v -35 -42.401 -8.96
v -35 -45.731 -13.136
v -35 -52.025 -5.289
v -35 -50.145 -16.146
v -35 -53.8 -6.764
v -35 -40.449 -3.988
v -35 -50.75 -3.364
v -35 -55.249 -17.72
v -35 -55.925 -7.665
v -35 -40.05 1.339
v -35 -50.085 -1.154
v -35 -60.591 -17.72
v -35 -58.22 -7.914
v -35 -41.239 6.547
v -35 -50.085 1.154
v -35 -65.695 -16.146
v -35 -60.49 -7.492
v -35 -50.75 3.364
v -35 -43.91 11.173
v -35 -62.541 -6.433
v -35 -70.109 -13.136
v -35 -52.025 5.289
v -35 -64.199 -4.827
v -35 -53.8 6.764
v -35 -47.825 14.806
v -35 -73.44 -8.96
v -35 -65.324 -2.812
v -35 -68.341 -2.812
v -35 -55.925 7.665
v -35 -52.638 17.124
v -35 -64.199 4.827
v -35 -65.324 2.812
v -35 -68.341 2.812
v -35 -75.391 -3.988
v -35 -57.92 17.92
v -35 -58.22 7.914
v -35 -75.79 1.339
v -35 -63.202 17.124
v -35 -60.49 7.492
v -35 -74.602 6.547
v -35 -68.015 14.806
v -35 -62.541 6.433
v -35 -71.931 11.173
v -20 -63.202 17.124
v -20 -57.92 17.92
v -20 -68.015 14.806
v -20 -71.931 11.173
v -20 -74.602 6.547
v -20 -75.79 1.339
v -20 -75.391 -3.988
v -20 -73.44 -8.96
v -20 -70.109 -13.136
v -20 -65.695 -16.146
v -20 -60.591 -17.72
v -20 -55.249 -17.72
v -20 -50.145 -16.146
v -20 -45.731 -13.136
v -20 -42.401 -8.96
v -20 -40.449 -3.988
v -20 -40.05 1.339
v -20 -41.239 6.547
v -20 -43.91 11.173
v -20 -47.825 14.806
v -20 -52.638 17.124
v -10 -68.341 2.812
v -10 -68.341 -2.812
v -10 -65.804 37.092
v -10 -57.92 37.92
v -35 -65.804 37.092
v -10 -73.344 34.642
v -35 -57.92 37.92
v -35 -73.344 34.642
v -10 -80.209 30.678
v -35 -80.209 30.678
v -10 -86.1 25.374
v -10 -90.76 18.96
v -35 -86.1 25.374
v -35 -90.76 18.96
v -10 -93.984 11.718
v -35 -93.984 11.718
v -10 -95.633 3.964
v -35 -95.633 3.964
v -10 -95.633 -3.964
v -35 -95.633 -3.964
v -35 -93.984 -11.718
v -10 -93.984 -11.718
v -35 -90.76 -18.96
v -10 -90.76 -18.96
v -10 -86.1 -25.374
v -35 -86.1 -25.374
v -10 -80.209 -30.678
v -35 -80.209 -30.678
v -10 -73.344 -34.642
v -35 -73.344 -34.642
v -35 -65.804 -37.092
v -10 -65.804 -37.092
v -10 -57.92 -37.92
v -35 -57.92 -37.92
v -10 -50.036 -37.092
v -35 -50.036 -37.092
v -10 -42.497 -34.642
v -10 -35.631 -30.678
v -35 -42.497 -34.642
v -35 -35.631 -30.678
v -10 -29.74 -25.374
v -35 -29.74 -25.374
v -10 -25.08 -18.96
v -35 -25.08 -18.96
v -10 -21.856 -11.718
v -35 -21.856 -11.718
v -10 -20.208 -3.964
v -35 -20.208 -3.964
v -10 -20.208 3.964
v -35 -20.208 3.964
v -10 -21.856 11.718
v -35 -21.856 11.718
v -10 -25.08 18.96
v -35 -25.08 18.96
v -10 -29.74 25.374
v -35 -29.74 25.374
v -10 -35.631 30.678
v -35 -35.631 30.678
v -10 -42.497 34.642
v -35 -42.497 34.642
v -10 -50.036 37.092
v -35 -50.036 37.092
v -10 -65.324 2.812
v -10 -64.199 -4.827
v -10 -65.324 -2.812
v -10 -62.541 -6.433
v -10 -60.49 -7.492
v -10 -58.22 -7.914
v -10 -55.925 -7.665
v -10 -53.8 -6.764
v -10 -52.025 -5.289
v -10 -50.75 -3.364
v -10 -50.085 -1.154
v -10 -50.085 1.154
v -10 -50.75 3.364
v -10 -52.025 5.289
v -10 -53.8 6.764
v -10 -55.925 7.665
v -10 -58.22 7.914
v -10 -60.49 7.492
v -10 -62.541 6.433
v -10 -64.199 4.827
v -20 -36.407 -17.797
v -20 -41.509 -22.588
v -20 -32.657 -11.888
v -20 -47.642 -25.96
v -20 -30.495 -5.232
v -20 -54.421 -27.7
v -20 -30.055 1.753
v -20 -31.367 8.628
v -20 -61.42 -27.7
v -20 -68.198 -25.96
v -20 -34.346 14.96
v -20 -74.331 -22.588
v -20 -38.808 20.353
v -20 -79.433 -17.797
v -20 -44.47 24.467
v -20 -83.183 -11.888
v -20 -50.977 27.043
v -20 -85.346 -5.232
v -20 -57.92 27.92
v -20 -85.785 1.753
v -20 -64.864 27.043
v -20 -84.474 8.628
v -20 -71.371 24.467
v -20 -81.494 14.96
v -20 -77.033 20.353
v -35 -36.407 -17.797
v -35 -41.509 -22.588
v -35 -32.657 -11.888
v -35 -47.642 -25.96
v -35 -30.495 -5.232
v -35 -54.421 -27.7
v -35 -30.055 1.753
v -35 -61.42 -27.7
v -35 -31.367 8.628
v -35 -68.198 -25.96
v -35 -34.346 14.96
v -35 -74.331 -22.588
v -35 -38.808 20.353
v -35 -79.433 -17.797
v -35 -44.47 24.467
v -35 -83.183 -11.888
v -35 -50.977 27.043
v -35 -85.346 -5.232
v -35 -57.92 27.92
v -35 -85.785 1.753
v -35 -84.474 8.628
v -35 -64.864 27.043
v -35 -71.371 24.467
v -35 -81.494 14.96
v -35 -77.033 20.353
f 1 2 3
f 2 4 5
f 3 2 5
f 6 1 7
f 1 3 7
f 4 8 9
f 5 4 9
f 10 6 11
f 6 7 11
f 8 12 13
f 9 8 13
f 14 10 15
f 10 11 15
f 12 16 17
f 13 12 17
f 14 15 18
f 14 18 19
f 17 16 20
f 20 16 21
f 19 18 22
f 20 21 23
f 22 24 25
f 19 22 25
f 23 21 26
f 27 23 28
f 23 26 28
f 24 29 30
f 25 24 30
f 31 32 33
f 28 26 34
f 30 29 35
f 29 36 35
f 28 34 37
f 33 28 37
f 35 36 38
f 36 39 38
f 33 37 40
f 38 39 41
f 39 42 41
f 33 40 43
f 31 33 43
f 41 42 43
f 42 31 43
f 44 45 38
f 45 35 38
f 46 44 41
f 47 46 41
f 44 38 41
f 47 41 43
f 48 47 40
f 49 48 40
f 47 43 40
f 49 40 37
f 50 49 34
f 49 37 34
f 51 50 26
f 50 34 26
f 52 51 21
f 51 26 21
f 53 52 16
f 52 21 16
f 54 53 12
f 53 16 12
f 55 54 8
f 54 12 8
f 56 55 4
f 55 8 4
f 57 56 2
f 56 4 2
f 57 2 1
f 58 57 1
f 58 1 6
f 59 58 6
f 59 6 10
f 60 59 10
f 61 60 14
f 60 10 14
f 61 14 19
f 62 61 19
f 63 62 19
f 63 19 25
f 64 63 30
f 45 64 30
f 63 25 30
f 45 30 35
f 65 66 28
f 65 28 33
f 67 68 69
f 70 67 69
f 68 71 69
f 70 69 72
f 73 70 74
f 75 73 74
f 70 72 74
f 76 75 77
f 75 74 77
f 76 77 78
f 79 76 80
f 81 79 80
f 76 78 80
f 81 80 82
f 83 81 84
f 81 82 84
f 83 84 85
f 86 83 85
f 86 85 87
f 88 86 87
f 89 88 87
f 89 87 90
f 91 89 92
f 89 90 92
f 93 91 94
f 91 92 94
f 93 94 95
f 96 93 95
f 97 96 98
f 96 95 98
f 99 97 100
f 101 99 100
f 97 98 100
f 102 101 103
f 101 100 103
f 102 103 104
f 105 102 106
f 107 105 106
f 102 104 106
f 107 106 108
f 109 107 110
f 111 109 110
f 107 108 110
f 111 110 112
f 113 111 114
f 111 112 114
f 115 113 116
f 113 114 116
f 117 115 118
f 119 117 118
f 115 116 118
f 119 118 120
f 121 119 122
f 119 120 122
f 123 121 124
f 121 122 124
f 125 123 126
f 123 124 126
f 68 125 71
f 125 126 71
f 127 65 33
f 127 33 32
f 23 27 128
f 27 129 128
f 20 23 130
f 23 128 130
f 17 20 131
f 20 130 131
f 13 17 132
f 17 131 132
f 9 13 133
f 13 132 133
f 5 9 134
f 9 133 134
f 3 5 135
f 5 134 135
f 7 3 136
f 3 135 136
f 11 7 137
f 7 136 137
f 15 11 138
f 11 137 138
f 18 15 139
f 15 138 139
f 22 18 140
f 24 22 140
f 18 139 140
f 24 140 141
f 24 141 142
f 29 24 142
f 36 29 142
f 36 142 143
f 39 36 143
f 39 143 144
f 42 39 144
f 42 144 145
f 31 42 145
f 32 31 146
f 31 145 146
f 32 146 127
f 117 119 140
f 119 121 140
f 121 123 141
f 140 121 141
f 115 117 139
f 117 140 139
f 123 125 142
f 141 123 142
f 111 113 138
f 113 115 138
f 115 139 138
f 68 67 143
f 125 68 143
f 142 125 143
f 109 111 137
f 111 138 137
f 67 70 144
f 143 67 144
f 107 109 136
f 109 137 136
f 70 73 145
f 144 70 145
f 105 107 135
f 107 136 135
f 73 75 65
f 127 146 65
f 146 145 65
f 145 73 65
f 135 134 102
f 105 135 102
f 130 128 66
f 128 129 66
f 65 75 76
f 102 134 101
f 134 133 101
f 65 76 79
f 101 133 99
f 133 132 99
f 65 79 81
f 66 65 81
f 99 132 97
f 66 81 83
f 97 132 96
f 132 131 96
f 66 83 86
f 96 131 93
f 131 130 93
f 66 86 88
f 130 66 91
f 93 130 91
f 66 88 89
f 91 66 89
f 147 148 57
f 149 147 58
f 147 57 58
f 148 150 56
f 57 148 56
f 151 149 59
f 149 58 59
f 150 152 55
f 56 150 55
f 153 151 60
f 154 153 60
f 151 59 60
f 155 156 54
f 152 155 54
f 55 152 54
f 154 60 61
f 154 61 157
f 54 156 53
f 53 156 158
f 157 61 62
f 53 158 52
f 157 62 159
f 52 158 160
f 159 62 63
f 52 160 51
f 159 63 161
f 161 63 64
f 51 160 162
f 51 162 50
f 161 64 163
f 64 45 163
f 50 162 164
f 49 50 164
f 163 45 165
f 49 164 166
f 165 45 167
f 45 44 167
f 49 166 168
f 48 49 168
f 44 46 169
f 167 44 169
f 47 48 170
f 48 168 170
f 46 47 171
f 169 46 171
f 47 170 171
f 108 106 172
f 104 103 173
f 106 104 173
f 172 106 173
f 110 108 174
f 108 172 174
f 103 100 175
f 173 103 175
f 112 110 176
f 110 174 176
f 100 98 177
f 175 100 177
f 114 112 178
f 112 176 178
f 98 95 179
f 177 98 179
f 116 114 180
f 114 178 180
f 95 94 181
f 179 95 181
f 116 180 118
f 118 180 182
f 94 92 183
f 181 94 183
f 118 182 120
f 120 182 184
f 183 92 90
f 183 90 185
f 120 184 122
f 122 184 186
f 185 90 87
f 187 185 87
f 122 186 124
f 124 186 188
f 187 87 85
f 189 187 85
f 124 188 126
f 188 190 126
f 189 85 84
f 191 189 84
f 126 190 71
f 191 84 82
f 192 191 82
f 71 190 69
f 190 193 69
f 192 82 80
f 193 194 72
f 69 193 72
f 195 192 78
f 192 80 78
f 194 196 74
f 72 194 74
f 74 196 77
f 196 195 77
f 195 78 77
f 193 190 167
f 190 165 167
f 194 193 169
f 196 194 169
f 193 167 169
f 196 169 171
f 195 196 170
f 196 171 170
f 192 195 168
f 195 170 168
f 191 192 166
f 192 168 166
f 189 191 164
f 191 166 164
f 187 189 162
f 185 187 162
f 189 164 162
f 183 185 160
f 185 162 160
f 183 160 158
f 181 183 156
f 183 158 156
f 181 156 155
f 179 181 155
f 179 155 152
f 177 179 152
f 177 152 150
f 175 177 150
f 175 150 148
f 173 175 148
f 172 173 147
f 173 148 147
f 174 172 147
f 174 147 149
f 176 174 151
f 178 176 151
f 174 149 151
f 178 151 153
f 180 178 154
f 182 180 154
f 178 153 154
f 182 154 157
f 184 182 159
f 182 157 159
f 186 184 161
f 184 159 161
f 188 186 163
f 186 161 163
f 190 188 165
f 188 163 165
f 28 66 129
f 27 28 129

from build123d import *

# Parameters (mm, degrees)
SKETCH2_W          = 5.6237504
SKETCH2_H          = 5.000603239
CUT_EXTRUDE1_DEPTH = 50


with BuildPart() as part:
    # Sketch1 → Revolve-Thin1 (revolve)
    with BuildSketch(Plane.XY, mode=Mode.PRIVATE) as revolve_thin1_sk:
        Polygon((-35, -30), (-20, -30), (-20, -40), (-35, -40), (-35, -50), (-10, -50), (-10, -20), (-35, -20), align=None)
    revolve(revolve_thin1_sk.sketch.rotate(Axis((-102.944705745, -57.920177064, 0), (1, 0, 0)), 90), axis=Axis((-102.944705745, -57.920177064, 0), (1, 0, 0)))

    # Sketch2 → Cut-Extrude1 (cut)
    with BuildSketch(Plane.ZY.offset(35)):
        with Locations((0, -65.840354128)):
            Rectangle(SKETCH2_W, SKETCH2_H)
    extrude(amount=-CUT_EXTRUDE1_DEPTH, mode=Mode.SUBTRACT)


solid = part.part
